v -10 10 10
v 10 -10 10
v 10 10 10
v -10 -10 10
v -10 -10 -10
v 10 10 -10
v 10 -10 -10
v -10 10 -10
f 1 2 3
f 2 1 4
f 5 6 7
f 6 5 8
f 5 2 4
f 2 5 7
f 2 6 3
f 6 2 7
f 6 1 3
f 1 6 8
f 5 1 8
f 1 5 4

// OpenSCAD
cameraWidth  = 126;
cameraHeight = 30.75;


minkowski()
{
    cube([20,20,20],true);
    polygon([[5,4],[4,5],[-4,5],[-5,4],[-5,-4],[-4,-5],[4,-5],[5,-4]]);    
}
